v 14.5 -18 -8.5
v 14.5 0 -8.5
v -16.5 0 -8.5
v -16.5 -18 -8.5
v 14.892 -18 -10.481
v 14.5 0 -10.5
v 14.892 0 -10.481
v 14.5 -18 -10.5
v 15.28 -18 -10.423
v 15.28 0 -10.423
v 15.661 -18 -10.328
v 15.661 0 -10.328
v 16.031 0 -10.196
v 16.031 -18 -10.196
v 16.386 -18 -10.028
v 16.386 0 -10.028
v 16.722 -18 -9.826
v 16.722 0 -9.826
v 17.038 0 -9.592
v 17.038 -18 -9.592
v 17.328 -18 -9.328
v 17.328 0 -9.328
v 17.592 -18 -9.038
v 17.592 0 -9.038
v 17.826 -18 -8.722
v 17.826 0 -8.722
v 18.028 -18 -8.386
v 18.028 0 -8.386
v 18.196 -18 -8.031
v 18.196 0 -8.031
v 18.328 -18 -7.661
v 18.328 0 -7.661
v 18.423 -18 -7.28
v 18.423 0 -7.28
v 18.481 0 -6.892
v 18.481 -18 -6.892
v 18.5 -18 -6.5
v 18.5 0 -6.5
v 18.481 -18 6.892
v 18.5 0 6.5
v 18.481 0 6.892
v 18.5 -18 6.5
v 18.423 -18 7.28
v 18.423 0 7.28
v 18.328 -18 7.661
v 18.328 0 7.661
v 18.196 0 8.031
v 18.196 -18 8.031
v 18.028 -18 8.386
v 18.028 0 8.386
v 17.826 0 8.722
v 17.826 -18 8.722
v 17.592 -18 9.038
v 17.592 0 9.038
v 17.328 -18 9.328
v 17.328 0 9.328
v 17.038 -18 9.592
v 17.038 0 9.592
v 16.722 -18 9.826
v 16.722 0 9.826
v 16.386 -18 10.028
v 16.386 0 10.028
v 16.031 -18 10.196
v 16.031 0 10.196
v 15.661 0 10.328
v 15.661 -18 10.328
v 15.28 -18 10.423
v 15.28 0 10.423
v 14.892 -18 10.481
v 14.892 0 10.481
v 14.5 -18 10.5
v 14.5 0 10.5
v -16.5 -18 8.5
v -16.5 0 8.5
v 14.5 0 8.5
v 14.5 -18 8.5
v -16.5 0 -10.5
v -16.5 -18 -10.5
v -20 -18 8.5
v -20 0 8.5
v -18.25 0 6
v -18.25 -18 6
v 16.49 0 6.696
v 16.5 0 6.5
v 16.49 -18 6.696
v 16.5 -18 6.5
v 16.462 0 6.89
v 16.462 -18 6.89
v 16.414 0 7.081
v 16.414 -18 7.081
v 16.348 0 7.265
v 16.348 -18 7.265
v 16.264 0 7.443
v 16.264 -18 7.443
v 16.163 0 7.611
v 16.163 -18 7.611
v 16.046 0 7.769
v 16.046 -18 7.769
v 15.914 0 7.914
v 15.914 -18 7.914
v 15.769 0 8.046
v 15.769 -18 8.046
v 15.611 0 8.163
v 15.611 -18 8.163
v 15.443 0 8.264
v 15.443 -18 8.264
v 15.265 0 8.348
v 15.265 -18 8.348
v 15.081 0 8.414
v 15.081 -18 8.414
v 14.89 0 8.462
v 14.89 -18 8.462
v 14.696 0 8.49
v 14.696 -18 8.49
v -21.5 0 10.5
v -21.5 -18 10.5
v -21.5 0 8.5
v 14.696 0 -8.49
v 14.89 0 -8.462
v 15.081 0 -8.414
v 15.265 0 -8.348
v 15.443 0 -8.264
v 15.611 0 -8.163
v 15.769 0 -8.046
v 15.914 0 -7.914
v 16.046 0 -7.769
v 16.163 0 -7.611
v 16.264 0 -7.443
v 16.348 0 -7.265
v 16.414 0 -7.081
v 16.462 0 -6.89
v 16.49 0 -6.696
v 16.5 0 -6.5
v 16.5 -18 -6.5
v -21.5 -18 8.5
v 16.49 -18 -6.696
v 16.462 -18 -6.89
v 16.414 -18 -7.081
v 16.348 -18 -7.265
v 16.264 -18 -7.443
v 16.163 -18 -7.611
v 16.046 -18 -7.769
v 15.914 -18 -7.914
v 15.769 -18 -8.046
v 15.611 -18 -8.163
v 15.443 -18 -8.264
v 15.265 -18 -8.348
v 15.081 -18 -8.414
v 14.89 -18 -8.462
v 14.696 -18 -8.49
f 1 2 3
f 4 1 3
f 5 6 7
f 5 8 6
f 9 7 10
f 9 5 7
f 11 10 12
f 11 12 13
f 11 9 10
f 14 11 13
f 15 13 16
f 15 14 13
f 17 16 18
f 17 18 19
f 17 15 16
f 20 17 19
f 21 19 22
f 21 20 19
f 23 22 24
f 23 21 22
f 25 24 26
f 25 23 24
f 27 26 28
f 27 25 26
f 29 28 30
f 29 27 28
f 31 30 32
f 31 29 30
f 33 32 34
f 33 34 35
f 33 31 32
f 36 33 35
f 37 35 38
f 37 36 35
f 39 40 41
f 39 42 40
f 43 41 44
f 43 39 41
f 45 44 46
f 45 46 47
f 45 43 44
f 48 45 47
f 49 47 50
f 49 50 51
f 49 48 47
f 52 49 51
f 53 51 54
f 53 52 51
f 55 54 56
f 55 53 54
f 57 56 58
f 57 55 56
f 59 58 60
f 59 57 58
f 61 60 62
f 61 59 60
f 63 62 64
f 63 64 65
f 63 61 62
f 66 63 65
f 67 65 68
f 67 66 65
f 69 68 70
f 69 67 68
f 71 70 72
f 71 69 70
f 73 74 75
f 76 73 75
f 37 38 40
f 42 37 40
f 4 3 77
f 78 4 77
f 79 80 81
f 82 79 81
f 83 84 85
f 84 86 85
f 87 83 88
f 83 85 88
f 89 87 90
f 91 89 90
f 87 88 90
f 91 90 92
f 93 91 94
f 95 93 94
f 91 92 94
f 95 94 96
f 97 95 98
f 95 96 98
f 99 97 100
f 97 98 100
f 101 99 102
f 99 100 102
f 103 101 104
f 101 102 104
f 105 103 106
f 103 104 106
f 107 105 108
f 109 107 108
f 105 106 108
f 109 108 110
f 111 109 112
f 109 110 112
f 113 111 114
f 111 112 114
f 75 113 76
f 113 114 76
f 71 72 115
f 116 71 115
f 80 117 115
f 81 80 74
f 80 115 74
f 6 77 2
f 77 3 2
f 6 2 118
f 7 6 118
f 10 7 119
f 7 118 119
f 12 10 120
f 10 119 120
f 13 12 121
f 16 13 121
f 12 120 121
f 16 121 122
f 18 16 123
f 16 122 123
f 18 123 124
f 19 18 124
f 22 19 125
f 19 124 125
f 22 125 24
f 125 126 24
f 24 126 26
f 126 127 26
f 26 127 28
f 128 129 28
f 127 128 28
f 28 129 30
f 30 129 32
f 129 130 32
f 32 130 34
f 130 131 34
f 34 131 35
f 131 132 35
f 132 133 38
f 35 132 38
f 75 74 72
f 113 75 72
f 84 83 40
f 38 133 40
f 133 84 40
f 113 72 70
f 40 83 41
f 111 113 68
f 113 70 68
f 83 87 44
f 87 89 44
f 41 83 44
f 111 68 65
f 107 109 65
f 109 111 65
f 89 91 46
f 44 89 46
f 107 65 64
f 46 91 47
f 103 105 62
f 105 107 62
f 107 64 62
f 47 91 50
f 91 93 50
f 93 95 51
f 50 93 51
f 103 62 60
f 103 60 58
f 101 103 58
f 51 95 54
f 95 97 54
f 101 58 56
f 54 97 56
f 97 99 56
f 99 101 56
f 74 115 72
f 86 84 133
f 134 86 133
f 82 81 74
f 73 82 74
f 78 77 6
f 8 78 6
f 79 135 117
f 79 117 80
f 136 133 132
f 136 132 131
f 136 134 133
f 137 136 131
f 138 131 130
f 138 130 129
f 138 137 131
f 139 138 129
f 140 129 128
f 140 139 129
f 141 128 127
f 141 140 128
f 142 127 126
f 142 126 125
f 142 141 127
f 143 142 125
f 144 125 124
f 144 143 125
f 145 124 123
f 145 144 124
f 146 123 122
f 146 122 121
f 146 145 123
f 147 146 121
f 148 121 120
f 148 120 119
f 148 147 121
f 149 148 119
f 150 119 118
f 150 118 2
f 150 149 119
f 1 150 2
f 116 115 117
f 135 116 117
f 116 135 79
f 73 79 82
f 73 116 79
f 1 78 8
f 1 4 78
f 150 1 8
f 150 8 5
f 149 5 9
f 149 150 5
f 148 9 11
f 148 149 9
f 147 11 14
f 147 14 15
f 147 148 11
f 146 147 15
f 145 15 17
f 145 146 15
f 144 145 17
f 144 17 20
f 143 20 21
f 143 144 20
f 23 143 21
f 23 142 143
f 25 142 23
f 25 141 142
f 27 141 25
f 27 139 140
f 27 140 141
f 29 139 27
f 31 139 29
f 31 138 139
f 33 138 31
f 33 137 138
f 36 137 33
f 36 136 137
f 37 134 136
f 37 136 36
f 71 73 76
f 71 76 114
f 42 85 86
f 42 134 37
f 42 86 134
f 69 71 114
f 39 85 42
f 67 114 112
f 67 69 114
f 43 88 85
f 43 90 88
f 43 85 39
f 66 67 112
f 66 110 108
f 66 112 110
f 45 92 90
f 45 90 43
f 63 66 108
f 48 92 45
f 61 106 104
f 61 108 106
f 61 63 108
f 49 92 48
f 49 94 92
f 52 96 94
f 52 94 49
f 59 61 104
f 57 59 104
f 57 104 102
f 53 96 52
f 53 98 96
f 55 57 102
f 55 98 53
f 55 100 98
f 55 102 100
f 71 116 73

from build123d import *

# Parameters (mm, degrees)
F1_DEPTH = 18
F2_R     = 2
F3_R     = 4


with BuildPart() as f1:
    # F0 (on Front) → F1 (new body)
    with BuildSketch(Plane.XZ):
        Polygon((16.5, 8.5), (16.5, -8.5), (-16.5, -8.5), (-16.5, -10.5), (18.5, -10.5), (18.5, 10.5), (-21.5, 10.5), (-21.5, 8.5), (-20, 8.5), (-18.25, 6), (-16.5, 8.5), align=None)
    extrude(amount=F1_DEPTH)

    # F2
    f2_edges = [f1.edges().sort_by_distance(p)[0] for p in [
        (16.5, -9, 8.5),
        (16.5, -9, -8.5),
    ]]
    fillet(f2_edges, radius=F2_R)

    # F3
    f3_edges = [f1.edges().sort_by_distance(p)[0] for p in [
        (18.5, -9, 10.5),
        (18.5, -9, -10.5),
    ]]
    fillet(f3_edges, radius=F3_R)


solid = f1.part
